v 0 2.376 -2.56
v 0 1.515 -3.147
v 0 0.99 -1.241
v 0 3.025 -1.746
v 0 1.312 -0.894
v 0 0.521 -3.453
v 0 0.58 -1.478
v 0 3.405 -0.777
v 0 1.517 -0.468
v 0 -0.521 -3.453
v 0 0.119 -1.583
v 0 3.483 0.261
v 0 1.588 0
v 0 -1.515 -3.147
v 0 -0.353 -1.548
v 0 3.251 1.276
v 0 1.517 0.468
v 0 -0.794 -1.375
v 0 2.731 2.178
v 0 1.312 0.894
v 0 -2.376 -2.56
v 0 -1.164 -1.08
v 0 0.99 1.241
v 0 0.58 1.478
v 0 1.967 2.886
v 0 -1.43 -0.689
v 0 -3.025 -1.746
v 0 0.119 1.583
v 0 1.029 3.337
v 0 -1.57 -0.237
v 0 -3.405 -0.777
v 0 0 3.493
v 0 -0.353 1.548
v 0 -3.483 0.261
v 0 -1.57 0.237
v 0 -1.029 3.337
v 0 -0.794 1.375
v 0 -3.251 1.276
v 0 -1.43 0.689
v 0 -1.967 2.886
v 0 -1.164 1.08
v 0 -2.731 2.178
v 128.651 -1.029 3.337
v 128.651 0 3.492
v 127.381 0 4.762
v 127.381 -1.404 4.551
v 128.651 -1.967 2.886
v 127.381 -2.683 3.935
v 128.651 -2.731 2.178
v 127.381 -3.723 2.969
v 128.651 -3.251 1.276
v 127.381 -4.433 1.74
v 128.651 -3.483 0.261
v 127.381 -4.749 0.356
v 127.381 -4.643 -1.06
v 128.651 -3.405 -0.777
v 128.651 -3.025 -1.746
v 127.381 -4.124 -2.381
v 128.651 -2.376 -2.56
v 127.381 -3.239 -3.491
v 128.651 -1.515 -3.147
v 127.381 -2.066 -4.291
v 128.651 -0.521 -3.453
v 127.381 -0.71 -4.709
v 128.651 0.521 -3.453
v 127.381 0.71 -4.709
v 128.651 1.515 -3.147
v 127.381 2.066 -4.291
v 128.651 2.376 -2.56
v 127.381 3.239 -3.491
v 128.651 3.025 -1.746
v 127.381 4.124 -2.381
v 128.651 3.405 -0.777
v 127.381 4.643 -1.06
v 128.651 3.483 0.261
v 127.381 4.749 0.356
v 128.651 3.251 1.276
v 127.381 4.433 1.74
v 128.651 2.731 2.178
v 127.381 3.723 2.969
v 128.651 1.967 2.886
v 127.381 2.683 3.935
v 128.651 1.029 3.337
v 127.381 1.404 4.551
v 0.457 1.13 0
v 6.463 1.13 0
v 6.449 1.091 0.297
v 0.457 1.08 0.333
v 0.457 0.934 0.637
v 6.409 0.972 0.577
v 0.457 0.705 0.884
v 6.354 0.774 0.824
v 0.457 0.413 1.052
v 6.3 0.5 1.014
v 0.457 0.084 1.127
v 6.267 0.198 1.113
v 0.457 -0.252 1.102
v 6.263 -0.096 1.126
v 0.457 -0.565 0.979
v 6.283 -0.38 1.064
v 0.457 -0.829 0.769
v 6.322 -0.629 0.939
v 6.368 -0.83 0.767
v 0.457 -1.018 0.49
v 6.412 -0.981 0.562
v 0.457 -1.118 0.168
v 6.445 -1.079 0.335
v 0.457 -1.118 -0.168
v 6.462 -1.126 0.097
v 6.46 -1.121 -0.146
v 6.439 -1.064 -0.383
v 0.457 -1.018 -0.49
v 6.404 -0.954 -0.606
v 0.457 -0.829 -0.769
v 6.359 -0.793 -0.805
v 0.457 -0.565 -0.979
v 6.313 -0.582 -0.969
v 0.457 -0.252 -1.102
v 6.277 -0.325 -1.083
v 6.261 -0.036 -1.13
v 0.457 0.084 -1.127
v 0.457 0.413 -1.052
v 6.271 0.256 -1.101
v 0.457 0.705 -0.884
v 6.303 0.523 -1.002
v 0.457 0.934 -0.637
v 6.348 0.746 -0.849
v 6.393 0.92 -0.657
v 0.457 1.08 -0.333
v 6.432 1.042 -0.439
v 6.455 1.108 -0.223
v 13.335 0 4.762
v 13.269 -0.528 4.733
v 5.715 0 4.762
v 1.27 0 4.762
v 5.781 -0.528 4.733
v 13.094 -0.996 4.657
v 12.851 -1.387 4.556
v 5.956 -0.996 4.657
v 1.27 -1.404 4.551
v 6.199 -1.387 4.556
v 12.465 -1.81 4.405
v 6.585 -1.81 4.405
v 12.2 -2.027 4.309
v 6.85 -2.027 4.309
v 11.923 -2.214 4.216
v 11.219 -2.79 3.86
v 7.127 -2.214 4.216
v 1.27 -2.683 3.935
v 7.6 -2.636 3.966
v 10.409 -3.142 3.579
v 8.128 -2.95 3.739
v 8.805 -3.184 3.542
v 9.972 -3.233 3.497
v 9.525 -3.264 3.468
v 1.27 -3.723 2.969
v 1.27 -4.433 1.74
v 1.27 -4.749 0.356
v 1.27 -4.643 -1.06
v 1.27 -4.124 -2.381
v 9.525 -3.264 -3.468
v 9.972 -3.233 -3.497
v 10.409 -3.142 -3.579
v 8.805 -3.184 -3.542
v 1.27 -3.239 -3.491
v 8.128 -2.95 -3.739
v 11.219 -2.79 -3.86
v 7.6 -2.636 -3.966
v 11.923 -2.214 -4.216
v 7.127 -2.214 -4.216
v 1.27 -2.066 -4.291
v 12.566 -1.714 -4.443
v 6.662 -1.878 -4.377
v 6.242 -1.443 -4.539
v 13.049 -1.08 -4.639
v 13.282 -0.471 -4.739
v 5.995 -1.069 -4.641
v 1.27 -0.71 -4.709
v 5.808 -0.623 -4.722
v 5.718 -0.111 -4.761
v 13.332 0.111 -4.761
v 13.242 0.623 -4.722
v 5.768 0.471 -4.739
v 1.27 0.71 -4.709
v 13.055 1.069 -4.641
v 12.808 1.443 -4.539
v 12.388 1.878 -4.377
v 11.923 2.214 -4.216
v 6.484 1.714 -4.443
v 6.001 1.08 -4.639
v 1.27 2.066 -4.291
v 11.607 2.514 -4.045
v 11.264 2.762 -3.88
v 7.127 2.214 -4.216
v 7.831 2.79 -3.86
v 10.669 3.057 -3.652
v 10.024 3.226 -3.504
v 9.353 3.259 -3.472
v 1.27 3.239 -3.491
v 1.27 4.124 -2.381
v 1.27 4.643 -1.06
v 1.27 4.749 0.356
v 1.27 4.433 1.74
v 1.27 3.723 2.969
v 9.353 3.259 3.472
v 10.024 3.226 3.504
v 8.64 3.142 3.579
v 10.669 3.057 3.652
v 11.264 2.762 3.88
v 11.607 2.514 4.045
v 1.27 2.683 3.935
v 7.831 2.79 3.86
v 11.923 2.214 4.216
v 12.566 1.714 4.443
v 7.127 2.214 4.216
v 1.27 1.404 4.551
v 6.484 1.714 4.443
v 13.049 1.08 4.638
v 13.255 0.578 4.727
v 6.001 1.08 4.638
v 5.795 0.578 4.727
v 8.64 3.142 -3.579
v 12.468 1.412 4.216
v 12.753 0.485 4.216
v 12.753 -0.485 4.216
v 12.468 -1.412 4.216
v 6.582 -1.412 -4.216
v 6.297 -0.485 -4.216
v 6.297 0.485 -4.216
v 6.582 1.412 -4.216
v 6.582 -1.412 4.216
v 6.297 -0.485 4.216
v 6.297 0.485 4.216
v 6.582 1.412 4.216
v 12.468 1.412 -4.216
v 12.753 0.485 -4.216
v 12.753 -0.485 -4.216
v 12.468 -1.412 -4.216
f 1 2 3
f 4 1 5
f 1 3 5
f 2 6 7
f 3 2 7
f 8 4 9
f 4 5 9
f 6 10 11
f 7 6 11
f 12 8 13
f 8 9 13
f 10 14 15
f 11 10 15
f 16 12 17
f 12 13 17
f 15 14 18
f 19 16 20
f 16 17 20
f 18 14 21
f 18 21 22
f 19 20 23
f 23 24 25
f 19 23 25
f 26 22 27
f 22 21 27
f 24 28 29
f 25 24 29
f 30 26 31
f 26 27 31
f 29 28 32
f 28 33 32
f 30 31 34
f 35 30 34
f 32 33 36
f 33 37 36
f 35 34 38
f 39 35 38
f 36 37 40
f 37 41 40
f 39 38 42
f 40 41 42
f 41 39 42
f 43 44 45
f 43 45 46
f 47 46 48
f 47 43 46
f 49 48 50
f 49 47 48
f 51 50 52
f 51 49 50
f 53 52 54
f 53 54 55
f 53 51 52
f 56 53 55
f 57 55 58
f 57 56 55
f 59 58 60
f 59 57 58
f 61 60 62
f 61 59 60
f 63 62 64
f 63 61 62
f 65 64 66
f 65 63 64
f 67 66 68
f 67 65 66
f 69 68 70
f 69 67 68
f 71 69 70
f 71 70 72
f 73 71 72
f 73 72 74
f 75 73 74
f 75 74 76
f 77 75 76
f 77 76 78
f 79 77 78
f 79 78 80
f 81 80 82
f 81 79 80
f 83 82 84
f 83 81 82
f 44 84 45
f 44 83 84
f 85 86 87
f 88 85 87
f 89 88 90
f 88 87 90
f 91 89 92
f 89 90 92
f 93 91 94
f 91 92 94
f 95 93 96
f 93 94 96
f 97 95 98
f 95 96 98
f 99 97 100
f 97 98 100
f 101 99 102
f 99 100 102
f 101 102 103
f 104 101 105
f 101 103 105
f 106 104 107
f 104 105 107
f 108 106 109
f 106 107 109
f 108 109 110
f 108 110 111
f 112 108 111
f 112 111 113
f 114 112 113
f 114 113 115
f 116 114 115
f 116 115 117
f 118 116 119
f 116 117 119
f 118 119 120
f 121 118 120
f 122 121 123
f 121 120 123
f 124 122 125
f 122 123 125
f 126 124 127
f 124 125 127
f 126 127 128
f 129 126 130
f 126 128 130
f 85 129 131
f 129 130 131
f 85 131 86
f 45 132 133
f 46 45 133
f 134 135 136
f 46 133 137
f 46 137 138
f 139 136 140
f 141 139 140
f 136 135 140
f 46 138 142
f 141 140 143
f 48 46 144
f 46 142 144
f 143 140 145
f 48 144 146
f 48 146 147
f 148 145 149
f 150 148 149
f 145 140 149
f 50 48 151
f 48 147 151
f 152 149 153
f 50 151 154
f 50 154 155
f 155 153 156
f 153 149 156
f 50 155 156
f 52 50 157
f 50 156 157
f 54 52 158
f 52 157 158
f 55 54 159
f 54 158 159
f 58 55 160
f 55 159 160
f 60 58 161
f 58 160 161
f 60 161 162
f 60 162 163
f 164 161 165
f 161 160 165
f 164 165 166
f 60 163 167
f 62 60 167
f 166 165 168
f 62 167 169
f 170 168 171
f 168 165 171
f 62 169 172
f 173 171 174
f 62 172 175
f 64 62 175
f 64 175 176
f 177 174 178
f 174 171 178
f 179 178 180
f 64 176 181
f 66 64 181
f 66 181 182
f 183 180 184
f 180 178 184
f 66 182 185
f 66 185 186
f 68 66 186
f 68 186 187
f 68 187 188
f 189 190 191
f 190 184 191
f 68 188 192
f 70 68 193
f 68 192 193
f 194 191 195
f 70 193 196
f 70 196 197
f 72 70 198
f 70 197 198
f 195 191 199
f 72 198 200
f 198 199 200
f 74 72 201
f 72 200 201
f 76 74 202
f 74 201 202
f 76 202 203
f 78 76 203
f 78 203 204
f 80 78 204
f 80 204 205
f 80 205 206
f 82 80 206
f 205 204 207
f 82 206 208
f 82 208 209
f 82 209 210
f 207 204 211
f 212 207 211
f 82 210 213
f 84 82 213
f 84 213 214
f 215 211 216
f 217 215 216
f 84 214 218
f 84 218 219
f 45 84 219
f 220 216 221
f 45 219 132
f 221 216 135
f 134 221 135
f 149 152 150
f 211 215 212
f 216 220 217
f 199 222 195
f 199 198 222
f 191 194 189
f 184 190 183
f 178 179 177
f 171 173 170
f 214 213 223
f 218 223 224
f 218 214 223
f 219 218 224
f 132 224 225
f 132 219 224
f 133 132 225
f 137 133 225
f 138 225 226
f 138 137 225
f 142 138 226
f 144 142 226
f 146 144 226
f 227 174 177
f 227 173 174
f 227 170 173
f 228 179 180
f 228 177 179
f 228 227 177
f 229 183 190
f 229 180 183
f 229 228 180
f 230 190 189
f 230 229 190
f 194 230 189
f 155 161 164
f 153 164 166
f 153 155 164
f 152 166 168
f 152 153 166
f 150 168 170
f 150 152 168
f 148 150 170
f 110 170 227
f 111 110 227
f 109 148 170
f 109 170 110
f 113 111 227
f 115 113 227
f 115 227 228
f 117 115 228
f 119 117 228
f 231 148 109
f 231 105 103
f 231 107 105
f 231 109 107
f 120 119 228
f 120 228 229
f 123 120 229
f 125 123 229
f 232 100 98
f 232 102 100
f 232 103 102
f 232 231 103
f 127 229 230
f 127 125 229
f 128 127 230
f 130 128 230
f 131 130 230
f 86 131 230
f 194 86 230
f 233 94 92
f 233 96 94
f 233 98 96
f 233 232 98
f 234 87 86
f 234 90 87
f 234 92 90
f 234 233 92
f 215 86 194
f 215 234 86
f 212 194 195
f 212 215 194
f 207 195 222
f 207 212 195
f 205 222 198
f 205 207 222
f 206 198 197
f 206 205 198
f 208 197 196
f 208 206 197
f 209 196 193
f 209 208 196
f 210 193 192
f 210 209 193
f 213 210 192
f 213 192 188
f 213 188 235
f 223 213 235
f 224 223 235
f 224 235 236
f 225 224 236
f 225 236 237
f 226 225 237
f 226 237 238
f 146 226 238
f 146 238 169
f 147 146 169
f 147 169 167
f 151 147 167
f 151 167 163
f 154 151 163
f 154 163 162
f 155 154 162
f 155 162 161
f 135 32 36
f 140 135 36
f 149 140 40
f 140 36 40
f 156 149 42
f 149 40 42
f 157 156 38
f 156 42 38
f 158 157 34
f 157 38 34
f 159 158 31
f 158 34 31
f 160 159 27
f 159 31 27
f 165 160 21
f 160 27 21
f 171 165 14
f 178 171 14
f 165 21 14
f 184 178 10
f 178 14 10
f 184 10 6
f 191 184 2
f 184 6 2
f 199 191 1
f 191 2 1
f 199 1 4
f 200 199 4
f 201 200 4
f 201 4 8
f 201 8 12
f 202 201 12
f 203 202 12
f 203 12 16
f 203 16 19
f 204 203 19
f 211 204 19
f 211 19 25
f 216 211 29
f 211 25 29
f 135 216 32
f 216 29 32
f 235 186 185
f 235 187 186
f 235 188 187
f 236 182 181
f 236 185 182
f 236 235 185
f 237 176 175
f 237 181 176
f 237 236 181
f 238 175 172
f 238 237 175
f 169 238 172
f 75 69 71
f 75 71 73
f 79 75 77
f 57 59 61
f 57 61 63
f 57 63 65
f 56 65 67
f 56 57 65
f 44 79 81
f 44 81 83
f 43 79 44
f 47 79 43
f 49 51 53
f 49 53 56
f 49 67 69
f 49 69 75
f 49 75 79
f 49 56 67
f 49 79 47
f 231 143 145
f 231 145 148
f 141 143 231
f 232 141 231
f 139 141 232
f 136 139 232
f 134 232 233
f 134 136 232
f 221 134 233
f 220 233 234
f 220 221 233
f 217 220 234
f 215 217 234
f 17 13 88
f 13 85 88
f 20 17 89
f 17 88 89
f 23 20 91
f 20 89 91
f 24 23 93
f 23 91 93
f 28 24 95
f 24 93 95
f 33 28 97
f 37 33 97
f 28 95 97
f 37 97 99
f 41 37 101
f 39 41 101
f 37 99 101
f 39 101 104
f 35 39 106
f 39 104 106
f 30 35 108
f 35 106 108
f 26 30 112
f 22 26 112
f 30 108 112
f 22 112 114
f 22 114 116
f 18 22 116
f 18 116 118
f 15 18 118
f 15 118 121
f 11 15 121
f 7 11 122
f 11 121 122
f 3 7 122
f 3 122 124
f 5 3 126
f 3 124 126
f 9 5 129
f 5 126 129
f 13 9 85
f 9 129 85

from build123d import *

# Parameters (mm, degrees)
SKETCH2_R           = 4.7625
BOSS_EXTRUDE1_DEPTH = 128.651
CHAMFER1_SIZE       = 1.27


# Read off the part's stored shape, not the designer's step: #4-40 Tapped Hole1
with BuildPart() as part:
    # Sketch2 → Boss-Extrude1 (new body)
    with BuildSketch(Plane(origin=(0, 0, 0), x_dir=(0, 0, -1), z_dir=(1, 0, 0))):
        with Locations(Location((0, 0, 0), (0, 0, 180))):
            Circle(SKETCH2_R)
    extrude(amount=BOSS_EXTRUDE1_DEPTH)

    # Chamfer1
    chamfer1_edges = [part.edges().sort_by_distance(p)[0] for p in [
        (0, 0, -4.7625),
        (128.651, 0, -4.7625),
    ]]
    chamfer(chamfer1_edges, length=CHAMFER1_SIZE)

    # Sketch9 → F (0.257) Diameter Hole2 (revolve, cut)
    with BuildSketch(Plane(origin=(9.525, 0, 4.7625), x_dir=(0, -1, 0), z_dir=(1, 0, 0))):
        Polygon((0, 0), (0, 9.525), (3.81, 9.525), (3.2639, 8.9789), (3.2639, 0.5461), (3.81, 0), align=None)
    revolve(axis=Axis((9.525, 0, 11.1125), (0, 0, -1)), mode=Mode.SUBTRACT)

    # #4-40 Tapped Hole1 outline → #4-40 Tapped Hole1 (revolve, cut)
    with BuildSketch(Plane.YX):
        Polygon((1.1303, 0.4572), (1.1303, 6.463087607), (0, 6.463087607), (0, 0), (1.5875, 0), align=None)
    revolve(axis=Axis((0, 0, 0), (1, 0, 0)), mode=Mode.SUBTRACT)


solid = part.part
